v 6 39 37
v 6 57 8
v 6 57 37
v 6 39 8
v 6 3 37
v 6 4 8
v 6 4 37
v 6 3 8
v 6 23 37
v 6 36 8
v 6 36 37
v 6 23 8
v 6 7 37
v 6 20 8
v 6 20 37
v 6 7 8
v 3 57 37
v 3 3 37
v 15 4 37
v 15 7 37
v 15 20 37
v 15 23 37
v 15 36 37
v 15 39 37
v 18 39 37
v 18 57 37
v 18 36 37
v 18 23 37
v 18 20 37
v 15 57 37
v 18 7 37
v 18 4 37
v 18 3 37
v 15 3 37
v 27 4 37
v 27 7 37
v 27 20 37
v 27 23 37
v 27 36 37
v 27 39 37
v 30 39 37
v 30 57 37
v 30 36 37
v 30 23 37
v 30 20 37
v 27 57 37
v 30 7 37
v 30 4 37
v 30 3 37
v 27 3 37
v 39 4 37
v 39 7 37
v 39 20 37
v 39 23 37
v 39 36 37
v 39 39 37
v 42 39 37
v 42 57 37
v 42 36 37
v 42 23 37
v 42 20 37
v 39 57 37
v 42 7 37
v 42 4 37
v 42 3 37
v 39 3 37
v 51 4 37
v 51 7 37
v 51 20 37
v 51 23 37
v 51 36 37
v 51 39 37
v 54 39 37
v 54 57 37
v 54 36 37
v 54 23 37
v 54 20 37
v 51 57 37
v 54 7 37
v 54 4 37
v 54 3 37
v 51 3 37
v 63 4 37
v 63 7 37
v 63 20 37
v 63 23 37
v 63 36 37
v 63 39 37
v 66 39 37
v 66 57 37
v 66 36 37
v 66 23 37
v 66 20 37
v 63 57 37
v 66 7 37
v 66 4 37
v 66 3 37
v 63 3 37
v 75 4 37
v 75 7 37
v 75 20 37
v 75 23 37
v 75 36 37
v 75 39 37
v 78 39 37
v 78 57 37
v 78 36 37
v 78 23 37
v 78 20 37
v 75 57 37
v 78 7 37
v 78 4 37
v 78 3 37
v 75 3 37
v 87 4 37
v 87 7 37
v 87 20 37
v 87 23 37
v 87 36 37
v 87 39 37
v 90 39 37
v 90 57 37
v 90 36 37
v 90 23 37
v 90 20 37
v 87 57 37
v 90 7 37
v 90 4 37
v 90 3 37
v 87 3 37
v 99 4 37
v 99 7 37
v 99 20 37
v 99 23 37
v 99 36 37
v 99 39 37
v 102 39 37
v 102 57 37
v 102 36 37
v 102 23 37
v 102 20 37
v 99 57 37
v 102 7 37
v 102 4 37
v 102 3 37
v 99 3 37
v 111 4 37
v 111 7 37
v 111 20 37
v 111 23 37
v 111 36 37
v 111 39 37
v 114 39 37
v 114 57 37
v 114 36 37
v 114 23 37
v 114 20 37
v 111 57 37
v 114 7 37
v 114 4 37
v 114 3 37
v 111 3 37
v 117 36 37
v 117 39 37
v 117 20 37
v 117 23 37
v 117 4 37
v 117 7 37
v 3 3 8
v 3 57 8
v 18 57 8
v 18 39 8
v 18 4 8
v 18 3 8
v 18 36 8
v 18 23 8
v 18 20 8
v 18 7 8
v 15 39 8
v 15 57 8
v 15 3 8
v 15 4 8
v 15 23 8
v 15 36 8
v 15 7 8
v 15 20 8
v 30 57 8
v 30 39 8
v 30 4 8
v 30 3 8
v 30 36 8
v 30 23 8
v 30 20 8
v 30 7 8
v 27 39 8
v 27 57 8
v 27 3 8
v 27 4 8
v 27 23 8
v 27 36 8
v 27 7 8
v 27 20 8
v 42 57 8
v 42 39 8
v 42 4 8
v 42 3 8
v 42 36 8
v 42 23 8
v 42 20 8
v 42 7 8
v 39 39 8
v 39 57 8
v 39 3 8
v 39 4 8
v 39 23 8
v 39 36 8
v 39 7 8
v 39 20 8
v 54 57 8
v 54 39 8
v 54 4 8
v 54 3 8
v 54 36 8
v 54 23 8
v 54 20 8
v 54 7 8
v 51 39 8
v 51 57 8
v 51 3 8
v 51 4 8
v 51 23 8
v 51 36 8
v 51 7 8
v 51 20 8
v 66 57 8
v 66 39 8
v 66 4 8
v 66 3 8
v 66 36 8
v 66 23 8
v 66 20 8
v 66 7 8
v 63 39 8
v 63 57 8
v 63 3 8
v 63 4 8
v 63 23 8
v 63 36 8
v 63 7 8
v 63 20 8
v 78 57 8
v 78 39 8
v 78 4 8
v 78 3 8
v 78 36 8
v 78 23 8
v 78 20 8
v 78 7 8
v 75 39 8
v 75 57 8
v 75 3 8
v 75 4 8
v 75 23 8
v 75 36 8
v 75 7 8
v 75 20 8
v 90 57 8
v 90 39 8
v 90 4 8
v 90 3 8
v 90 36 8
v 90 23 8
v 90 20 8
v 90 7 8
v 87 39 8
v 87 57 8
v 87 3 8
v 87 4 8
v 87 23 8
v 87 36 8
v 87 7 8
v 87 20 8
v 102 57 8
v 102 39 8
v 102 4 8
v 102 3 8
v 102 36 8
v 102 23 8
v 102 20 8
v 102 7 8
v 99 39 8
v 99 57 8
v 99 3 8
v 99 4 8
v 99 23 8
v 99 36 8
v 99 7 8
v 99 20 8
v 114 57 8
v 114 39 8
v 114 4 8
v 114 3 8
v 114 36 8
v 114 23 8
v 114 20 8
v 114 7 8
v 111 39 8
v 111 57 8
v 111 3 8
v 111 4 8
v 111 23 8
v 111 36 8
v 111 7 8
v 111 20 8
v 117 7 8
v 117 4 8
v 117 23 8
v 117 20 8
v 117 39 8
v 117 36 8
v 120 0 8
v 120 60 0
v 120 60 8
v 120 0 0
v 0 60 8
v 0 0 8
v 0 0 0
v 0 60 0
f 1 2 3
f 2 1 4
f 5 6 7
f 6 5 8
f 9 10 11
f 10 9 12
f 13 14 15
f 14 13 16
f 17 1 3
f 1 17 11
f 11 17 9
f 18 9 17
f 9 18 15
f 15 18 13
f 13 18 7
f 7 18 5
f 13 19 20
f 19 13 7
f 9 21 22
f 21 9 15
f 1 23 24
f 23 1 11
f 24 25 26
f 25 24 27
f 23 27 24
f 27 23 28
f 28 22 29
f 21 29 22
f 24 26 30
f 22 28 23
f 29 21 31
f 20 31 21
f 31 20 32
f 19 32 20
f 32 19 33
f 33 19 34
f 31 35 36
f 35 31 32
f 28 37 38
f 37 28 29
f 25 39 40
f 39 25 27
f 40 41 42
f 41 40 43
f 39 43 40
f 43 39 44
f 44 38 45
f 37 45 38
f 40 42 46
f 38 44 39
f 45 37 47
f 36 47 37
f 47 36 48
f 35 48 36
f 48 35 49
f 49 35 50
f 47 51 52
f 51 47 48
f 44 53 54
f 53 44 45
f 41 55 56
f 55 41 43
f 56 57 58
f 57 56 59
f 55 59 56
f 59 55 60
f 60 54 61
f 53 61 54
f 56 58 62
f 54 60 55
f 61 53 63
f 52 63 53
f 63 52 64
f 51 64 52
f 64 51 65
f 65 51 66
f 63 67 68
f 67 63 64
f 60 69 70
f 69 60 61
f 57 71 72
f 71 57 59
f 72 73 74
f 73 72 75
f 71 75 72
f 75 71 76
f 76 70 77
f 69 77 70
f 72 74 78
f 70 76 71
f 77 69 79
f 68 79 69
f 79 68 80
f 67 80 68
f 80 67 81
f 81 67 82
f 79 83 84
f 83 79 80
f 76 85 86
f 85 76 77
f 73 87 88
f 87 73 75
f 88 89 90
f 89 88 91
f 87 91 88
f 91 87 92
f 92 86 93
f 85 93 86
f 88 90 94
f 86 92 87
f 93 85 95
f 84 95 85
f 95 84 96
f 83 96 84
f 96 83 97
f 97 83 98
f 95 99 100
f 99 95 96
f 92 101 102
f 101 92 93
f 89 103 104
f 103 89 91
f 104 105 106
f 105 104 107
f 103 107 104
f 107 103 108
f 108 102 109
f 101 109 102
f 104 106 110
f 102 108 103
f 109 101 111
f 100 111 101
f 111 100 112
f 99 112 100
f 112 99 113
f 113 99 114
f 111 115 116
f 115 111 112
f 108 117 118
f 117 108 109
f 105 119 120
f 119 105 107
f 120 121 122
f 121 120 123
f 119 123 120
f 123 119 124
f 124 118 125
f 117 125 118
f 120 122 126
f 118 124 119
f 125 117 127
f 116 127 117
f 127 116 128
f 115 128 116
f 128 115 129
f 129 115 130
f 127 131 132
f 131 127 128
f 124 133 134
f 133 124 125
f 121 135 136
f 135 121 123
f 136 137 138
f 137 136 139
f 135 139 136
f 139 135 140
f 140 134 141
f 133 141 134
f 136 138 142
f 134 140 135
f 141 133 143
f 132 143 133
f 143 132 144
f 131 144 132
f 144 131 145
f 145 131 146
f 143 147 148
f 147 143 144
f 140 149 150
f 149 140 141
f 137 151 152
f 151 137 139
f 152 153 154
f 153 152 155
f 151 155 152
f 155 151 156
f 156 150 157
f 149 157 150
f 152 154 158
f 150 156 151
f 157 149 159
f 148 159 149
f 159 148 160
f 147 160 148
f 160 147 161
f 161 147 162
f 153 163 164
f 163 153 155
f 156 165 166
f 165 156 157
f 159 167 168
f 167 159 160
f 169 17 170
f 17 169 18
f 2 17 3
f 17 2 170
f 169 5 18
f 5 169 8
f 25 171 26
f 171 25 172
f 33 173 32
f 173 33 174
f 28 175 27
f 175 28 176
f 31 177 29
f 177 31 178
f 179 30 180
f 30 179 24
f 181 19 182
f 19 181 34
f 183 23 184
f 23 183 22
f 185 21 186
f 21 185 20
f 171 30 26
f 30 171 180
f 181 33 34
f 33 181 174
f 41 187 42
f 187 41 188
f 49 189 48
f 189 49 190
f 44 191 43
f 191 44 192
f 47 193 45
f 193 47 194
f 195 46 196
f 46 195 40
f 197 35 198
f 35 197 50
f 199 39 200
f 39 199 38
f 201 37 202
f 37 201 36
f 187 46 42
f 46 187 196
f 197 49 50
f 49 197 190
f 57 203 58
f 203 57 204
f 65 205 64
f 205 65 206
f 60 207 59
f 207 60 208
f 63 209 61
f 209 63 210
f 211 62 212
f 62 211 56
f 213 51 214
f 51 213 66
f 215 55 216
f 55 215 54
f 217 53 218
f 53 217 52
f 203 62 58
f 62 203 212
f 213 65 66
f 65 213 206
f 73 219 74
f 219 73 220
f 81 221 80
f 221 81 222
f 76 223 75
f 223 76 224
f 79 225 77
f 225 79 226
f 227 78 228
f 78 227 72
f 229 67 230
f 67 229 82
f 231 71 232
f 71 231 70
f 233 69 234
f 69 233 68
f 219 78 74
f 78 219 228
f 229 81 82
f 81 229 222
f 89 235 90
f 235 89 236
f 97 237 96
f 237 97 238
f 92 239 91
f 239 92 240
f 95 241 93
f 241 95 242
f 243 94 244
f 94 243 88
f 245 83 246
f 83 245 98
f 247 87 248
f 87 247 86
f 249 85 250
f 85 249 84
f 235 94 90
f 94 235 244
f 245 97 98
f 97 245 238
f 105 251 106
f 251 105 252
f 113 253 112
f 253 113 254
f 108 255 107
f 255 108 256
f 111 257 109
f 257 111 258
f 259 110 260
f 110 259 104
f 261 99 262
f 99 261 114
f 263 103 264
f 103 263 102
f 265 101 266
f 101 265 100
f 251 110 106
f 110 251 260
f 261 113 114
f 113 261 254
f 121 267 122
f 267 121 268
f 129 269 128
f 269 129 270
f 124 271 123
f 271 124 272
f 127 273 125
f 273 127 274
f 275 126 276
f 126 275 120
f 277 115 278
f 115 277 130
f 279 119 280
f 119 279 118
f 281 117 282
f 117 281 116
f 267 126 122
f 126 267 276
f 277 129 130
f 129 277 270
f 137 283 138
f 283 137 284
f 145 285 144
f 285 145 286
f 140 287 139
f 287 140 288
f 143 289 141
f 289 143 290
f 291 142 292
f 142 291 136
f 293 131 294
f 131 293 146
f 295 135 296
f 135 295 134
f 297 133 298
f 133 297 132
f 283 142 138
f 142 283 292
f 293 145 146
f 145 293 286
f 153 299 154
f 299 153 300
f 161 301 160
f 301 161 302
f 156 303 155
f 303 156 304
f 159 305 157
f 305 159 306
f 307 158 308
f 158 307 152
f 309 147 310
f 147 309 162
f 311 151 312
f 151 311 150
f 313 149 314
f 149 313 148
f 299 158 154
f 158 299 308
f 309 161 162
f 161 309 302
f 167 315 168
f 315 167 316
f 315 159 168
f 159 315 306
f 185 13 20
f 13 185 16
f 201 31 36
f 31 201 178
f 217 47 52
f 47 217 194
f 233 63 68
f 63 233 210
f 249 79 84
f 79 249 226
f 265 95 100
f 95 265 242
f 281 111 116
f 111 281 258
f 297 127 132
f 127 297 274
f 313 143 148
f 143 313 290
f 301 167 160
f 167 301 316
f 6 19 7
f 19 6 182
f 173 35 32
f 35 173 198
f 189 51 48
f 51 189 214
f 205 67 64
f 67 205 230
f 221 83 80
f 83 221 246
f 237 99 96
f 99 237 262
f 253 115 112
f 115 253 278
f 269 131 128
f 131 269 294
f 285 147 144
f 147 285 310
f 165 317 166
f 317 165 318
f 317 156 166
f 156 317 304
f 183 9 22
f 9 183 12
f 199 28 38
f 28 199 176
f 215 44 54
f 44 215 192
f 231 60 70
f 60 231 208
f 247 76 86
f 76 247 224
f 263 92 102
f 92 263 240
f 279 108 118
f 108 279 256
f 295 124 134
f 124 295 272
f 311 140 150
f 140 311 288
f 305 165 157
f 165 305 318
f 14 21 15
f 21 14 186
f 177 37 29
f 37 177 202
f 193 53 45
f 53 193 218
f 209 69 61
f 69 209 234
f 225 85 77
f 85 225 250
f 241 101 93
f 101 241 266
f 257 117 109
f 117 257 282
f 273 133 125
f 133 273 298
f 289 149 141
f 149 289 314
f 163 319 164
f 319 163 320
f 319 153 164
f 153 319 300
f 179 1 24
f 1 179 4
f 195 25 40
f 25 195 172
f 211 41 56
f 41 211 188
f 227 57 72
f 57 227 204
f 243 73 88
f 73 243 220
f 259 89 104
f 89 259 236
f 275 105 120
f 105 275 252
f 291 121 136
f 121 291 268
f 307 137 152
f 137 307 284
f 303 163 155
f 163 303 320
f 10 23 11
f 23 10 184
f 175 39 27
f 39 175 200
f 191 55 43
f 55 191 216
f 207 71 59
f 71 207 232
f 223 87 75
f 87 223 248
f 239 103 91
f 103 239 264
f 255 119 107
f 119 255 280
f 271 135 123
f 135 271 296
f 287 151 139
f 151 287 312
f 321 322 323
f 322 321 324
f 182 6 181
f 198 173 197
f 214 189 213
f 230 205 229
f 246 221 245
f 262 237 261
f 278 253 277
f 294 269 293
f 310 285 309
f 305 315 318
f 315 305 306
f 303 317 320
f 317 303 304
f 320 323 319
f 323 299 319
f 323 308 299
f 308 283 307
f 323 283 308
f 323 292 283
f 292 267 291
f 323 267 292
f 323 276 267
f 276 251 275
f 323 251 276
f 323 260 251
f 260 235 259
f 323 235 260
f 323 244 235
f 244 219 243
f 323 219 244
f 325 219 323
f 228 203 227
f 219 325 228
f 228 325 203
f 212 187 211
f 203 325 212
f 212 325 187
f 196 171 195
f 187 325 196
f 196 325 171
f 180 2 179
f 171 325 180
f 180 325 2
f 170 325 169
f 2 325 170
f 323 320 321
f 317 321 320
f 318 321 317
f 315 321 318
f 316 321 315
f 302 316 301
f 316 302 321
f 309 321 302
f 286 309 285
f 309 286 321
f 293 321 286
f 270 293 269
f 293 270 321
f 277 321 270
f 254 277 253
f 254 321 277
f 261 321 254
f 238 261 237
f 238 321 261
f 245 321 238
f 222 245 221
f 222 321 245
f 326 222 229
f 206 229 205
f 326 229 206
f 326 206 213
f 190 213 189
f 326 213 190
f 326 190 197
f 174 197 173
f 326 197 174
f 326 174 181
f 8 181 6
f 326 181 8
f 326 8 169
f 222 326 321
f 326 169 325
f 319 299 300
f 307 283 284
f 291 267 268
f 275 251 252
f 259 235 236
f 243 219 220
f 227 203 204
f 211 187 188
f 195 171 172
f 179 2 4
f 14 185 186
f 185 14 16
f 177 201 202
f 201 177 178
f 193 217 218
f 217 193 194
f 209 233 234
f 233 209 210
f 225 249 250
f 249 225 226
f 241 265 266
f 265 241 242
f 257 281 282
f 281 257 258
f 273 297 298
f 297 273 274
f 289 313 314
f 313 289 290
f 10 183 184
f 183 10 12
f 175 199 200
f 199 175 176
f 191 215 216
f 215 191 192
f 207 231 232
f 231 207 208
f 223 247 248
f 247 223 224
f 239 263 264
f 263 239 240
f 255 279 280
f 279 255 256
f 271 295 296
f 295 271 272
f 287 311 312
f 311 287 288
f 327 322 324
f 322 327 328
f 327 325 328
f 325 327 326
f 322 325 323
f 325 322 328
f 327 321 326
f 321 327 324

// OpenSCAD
$fn = 32;

// ----------------------------------------------------------------------
// Heatsink: cross fin block
// ----------------------------------------------------------------------

// --- parameters (mm) ---
base_l = 120;             // base length, X
base_w = 60;              // base width, Y
base_t = 8;               // base plate thickness
fin_h = 30;               // fin height above the base
fin_t = 3;                // fin thickness
edge = 3;                 // margin from the base ends
pitch = 12;               // fin pitch
rib_pitch = 16;           // cross rib pitch

n_fins = floor((base_l - 2 * edge - fin_t) / pitch) + 1;  // fin count
total_h = base_t + fin_h - 1;  // overall height
n_ribs = floor((base_w - 2 * edge) / rib_pitch);  // rib count

union() {
  cube([base_l, base_w, base_t]);
  for (i = [0 : n_fins - 1])
    translate([edge + i * pitch, edge, base_t - 1])
      cube([fin_t, base_w - 2 * edge, fin_h]);
  for (i = [0 : n_ribs - 1])
    translate([edge, edge + 1 + i * rib_pitch, base_t - 1])
      cube([base_l - 2 * edge, fin_t, fin_h]);
}
